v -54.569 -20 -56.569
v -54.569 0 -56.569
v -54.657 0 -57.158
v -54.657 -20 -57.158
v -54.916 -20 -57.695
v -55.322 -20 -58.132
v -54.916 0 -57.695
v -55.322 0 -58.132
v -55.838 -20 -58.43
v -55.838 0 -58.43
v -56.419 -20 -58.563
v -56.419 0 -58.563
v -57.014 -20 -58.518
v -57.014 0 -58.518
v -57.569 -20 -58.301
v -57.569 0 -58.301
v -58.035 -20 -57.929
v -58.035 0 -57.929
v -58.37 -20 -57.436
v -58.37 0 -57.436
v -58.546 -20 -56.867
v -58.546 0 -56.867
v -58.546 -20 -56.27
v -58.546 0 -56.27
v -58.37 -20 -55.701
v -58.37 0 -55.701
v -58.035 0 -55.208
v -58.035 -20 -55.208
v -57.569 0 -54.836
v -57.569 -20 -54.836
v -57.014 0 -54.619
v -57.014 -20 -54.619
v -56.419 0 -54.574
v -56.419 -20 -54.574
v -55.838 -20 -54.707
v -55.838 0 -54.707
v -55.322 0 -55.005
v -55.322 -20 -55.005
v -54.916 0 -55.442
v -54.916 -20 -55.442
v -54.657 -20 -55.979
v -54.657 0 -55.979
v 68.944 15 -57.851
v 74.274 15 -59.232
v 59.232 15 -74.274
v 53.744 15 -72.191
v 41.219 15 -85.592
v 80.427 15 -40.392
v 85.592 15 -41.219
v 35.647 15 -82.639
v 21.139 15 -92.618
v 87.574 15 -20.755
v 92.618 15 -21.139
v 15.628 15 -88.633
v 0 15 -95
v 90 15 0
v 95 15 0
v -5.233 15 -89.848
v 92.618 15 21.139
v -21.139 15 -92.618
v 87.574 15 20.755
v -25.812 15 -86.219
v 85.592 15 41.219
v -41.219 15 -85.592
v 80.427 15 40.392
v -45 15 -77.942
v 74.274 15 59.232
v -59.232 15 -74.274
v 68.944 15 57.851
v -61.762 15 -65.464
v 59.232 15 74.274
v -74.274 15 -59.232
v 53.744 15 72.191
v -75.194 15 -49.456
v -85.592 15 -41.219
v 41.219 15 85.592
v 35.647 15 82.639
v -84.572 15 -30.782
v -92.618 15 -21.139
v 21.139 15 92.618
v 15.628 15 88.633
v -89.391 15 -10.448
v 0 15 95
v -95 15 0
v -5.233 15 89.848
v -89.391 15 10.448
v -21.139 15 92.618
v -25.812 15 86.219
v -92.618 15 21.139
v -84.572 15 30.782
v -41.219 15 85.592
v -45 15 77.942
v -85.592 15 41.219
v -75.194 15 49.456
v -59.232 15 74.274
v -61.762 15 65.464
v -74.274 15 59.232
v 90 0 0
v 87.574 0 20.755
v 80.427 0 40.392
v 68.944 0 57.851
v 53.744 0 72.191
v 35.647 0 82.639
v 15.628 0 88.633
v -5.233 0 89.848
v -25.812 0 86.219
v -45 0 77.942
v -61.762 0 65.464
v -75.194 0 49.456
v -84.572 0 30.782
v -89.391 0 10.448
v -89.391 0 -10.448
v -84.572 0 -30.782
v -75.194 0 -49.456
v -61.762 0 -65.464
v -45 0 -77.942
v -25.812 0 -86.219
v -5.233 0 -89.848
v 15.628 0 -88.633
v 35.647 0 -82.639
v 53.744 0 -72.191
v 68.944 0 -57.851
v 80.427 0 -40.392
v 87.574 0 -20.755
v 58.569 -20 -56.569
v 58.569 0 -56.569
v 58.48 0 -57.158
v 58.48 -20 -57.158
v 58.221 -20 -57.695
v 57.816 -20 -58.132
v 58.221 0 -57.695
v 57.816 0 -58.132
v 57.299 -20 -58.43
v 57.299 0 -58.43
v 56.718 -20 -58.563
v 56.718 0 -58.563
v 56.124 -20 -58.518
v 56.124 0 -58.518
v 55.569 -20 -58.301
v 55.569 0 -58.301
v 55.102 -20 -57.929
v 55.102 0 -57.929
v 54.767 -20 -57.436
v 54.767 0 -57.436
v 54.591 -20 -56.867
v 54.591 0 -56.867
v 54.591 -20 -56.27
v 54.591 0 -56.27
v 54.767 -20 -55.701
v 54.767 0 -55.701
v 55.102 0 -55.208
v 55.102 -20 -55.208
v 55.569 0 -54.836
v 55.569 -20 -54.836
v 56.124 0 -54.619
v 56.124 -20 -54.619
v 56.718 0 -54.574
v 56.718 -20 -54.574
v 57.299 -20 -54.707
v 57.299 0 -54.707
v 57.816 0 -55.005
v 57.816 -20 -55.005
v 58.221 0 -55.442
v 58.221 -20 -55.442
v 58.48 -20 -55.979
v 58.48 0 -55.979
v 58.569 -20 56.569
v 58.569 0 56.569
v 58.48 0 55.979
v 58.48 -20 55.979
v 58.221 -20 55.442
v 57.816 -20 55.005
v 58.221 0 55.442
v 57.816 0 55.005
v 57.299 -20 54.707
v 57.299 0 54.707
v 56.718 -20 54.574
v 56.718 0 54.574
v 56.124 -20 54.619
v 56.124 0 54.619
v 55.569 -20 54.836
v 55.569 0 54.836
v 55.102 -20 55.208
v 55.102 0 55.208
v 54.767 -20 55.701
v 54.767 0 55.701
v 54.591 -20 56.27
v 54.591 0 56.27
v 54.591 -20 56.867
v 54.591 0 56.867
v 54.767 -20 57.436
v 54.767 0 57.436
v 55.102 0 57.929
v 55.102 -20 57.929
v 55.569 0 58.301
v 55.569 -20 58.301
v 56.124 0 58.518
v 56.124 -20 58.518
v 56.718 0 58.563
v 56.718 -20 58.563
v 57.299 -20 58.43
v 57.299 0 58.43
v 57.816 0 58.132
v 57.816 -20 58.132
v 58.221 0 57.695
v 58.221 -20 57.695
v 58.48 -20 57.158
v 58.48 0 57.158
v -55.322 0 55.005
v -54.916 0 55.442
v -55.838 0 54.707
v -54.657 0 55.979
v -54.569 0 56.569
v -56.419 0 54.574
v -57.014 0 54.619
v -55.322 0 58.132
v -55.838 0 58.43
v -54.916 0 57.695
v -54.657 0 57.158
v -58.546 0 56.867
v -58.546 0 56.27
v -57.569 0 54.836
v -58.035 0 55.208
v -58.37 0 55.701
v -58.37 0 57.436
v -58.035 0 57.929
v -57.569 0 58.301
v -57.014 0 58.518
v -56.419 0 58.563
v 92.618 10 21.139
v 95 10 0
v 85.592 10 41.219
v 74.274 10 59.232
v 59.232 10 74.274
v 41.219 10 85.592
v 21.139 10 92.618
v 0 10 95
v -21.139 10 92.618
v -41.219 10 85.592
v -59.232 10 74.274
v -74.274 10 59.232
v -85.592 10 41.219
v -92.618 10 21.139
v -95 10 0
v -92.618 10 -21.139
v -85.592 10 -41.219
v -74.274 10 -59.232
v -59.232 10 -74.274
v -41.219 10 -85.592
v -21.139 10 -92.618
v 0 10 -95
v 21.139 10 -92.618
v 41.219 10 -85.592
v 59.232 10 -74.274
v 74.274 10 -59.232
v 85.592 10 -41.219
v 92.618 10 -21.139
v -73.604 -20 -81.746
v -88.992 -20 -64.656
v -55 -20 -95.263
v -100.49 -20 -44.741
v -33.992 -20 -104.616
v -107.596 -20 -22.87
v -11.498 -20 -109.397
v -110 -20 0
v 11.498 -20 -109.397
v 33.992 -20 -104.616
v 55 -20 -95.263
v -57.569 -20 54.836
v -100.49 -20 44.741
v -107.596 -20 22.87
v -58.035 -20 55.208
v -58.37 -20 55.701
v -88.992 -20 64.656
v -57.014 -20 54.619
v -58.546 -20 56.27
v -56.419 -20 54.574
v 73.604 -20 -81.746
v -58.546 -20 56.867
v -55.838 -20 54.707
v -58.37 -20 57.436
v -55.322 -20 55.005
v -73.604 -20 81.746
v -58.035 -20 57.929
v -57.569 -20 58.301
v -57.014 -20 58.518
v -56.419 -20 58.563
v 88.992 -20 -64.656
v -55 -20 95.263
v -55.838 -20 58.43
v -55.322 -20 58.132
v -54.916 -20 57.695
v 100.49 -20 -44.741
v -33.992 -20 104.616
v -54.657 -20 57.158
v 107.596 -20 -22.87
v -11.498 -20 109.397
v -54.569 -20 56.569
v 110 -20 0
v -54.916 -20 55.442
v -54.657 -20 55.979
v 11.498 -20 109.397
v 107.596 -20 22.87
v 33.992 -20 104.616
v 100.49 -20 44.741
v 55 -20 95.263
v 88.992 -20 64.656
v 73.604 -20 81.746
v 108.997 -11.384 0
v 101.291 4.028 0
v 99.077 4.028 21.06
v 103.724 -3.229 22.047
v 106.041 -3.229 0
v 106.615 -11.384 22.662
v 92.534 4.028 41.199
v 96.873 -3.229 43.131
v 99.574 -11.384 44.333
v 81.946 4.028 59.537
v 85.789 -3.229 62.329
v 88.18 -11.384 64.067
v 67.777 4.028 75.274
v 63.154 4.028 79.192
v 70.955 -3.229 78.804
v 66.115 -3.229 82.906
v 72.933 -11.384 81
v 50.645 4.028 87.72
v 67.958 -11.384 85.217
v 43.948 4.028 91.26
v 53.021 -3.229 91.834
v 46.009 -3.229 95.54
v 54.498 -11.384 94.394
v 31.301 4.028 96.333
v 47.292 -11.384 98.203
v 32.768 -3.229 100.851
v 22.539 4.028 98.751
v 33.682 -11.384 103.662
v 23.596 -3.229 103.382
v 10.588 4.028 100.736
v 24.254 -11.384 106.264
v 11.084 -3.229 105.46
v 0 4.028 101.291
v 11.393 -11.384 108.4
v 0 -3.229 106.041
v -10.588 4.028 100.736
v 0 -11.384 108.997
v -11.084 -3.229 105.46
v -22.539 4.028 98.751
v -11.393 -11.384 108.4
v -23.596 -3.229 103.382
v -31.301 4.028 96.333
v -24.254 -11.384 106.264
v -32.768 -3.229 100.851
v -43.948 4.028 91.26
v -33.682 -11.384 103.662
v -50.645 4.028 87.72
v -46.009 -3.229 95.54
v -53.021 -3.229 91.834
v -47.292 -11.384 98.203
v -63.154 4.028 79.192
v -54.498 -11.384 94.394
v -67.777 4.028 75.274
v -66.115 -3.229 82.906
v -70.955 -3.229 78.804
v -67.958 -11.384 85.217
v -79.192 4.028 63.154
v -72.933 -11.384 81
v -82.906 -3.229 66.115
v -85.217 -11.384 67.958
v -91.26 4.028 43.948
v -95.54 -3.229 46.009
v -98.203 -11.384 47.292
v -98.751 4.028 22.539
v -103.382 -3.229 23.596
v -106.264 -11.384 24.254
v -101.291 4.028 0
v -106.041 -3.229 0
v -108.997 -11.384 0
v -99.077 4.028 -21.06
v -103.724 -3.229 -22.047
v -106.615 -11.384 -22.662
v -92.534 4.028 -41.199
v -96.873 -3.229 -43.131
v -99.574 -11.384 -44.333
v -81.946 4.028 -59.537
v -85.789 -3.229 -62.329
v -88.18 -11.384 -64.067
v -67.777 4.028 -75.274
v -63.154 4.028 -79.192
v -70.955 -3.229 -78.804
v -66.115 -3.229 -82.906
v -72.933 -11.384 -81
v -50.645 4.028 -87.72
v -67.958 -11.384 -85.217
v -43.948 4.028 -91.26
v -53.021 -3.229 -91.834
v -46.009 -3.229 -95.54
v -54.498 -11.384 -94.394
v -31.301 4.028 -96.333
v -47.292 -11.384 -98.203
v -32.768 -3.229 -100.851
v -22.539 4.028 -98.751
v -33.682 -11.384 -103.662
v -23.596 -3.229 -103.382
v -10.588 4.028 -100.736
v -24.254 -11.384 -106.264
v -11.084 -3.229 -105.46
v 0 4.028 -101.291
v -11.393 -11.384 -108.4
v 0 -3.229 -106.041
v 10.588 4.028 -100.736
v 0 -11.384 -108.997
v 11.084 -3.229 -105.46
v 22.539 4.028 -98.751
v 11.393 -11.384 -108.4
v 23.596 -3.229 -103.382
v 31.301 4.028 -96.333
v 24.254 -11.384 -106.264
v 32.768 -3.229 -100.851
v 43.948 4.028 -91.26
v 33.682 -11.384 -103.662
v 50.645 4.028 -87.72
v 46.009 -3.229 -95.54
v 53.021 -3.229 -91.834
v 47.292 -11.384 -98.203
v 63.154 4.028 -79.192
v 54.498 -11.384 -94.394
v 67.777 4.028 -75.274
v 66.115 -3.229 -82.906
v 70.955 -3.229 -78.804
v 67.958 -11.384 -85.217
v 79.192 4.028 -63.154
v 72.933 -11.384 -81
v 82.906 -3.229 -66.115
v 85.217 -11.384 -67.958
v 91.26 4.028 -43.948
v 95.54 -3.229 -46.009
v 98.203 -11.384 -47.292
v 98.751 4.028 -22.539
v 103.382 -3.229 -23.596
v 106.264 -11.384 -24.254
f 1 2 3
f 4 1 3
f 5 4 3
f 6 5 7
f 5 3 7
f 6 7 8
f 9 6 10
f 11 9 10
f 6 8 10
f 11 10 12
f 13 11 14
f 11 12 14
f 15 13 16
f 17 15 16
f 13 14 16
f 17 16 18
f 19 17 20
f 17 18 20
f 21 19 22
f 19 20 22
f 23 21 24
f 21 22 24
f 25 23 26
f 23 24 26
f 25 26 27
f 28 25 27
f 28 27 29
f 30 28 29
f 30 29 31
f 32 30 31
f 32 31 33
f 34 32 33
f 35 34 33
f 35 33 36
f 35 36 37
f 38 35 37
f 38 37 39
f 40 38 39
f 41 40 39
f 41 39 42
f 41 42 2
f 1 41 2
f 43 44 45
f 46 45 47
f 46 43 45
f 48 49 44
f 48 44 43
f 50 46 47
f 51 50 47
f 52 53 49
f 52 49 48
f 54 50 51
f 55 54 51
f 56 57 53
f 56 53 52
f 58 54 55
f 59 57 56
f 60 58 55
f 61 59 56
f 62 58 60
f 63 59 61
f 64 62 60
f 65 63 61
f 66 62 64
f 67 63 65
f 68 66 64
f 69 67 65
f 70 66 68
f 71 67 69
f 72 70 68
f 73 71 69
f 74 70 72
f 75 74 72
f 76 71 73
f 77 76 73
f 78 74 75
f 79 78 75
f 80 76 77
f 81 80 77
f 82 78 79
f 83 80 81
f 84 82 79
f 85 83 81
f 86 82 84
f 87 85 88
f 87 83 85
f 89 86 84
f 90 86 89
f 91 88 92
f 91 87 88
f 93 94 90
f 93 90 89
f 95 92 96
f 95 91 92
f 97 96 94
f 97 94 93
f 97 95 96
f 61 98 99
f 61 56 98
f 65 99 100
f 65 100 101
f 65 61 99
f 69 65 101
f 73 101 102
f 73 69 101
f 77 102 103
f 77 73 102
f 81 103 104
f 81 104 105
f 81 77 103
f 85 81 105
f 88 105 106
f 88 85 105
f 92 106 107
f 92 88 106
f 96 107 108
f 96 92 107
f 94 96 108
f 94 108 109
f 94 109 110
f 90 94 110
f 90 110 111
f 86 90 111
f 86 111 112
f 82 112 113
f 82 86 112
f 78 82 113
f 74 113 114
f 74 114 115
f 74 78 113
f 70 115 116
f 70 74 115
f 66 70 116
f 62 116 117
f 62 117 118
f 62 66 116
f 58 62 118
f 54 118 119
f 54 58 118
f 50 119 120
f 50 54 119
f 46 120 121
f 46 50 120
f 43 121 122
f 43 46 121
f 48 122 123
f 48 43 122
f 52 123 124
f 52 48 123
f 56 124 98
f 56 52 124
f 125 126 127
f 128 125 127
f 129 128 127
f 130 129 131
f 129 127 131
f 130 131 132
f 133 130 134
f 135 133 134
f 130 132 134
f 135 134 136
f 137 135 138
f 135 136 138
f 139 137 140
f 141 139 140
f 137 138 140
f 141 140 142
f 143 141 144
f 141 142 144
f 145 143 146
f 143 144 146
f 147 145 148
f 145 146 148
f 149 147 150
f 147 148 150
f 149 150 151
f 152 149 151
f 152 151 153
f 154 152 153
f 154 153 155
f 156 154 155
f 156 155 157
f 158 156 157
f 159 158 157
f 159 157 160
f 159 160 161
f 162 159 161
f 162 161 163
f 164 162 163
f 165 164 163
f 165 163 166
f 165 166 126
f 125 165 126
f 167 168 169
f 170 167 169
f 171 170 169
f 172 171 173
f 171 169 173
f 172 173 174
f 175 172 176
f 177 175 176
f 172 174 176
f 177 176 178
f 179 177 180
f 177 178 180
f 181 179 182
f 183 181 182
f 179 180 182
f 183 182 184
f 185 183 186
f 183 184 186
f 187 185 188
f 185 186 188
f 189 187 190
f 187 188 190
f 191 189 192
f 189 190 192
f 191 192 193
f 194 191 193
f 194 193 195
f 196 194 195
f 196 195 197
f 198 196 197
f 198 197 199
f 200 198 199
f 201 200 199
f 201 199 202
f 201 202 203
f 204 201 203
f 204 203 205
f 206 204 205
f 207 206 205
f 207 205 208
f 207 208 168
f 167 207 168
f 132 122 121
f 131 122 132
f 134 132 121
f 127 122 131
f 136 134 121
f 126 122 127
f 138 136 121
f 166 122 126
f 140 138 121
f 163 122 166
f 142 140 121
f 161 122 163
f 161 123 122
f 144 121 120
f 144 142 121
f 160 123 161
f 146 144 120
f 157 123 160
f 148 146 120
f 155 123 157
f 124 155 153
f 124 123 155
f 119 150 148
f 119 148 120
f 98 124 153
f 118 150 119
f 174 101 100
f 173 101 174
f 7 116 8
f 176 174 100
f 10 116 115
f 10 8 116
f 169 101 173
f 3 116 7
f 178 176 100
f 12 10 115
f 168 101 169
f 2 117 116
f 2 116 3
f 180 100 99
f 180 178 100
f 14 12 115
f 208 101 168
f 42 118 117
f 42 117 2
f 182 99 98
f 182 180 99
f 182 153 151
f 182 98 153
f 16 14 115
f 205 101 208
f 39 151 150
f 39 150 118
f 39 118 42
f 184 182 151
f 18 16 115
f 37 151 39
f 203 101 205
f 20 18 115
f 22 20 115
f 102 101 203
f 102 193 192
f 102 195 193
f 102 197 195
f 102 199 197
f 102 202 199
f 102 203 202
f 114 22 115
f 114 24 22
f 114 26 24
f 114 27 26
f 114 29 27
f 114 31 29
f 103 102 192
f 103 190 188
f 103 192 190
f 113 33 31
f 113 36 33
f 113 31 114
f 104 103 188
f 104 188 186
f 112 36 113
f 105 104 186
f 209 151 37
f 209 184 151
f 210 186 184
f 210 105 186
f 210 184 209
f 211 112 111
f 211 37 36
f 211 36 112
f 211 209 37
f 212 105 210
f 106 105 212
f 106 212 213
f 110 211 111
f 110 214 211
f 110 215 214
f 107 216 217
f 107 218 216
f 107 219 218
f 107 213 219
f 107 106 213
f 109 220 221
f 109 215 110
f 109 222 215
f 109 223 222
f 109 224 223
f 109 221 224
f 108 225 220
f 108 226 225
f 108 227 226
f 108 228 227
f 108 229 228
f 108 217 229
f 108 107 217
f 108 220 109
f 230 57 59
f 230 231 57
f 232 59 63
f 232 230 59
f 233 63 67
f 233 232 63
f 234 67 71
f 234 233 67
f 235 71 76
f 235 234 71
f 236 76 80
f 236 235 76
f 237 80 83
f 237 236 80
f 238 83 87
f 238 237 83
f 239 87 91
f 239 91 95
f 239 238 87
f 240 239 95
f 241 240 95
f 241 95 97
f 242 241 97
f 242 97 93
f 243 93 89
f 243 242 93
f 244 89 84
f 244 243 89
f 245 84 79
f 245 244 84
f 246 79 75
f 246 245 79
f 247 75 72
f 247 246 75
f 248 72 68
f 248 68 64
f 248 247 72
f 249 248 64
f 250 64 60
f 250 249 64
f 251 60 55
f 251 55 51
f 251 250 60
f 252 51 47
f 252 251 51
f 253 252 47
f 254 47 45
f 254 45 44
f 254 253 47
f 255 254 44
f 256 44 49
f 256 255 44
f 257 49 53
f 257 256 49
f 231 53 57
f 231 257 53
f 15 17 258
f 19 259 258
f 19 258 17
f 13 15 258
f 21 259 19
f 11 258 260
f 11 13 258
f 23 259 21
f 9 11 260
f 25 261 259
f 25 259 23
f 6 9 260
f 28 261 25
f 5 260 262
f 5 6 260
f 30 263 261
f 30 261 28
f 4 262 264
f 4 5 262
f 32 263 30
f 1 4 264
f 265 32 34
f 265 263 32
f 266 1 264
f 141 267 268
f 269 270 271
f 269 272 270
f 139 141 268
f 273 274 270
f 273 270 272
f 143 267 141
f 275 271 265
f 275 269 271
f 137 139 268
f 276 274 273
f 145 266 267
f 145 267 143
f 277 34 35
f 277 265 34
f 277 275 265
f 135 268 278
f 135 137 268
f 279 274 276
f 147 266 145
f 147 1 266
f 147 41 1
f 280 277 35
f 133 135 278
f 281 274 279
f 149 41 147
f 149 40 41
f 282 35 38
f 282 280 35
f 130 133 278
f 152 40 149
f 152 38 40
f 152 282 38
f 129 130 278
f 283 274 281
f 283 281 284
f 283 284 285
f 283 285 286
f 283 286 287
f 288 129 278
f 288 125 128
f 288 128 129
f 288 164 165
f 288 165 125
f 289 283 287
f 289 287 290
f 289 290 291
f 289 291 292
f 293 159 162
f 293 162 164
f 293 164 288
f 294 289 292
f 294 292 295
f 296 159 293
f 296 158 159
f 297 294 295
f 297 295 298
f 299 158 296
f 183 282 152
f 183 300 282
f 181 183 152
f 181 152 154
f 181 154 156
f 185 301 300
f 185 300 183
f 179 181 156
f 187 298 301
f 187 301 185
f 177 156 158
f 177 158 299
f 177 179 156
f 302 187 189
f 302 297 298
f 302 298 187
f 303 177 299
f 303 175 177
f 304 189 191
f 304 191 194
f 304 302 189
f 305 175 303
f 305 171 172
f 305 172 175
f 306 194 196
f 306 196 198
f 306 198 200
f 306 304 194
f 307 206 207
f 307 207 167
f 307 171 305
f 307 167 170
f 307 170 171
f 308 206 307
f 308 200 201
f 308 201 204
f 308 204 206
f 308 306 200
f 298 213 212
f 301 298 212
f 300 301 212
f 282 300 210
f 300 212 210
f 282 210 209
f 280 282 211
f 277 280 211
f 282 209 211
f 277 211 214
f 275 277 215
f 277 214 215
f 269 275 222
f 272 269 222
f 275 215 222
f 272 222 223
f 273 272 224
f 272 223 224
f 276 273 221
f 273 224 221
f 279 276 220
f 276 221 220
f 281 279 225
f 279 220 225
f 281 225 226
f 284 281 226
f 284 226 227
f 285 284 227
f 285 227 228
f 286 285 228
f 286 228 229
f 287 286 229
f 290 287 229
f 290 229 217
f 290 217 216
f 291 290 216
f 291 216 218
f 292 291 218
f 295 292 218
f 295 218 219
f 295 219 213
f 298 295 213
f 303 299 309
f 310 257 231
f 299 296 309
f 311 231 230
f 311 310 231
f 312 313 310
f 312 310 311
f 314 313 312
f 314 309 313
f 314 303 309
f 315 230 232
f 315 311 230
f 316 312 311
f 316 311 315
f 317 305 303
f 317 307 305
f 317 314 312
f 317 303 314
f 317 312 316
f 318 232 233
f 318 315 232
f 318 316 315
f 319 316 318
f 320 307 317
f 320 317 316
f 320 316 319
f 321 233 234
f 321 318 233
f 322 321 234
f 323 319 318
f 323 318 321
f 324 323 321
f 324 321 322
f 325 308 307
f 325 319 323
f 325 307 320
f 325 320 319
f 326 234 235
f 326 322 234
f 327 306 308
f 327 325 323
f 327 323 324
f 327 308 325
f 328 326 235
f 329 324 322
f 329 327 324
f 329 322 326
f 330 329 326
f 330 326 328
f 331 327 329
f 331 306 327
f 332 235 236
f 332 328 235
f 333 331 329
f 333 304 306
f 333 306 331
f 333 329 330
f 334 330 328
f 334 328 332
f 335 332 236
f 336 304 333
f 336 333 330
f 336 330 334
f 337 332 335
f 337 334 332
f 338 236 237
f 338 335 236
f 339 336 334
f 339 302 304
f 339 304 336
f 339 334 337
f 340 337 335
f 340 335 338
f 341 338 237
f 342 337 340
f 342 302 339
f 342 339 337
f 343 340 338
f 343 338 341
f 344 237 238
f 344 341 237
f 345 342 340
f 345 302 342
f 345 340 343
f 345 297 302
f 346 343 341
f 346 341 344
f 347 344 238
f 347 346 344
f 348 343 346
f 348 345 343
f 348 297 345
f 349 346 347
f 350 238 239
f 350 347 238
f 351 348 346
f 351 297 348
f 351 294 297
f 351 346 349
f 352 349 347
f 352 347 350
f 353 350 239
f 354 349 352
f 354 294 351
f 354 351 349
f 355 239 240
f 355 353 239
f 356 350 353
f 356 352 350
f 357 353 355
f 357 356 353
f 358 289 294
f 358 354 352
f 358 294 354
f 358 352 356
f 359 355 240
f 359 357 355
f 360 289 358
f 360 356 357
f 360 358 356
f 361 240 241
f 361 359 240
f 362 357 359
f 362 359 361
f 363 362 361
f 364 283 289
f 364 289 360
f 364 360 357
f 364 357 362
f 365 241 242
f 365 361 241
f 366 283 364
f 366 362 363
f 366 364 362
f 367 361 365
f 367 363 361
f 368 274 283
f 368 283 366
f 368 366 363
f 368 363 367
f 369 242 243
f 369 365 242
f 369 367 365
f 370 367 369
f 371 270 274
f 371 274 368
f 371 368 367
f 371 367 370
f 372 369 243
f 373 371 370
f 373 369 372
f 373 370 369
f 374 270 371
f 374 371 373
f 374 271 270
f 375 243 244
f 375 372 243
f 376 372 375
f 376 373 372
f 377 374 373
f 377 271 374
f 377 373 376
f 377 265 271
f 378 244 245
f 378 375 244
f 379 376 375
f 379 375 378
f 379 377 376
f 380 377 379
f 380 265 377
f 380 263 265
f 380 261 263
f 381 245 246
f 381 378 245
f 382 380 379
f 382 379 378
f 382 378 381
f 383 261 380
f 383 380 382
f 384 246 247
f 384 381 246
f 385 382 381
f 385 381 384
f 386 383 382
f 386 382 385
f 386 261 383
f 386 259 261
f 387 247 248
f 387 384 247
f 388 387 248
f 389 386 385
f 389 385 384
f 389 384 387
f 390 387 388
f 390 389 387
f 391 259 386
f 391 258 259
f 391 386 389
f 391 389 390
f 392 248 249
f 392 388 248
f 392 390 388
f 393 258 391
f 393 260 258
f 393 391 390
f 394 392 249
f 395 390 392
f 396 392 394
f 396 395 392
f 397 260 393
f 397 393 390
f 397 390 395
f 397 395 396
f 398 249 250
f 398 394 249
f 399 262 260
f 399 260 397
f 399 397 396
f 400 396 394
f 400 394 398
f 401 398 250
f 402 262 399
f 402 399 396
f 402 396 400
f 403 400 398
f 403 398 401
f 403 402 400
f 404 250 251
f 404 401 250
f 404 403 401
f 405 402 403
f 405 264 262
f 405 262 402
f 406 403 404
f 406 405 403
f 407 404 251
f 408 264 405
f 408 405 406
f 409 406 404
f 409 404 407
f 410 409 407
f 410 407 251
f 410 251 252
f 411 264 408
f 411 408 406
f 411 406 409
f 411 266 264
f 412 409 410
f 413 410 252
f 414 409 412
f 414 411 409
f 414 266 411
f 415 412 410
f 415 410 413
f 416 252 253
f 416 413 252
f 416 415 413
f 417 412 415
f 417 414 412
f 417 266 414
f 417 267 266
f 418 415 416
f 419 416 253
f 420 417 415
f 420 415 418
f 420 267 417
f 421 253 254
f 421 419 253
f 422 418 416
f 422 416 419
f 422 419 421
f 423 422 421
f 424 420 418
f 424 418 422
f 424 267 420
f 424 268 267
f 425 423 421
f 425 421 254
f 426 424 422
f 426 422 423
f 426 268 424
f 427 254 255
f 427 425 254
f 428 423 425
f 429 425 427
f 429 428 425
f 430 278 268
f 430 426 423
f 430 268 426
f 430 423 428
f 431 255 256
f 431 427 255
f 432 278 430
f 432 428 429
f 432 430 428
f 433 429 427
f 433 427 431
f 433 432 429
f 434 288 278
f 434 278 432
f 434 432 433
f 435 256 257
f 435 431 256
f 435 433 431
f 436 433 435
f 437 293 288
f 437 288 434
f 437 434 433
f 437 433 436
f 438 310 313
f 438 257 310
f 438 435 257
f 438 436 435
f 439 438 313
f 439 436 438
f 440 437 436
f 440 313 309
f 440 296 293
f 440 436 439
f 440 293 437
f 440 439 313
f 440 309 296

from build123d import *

# Parameters (mm, degrees)
SKETCH1_R          = 2
CUT_EXTRUDE1_DEPTH = 21


with BuildPart() as part:
    # Sketch2 → Revolve1 (revolve)
    with BuildSketch(Plane.XY):
        with BuildLine():
            Line((90, 0), (90, 15))
            Line((90, 15), (95, 15))
            Line((95, 15), (95, 10))
            ThreePointArc((95, 10), (106.041019662, -3.229490169), (110, -20))
            Line((110, -20), (0, -20))
            Line((0, -20), (0, 0))
            Line((0, 0), (90, 0))
        make_face()
    revolve(axis=Axis((0, 0, 0), (0, -1, 0)))

    # Sketch1 → Cut-Extrude1 (cut, through all)
    with BuildSketch(Plane(origin=(0, 0, 0), x_dir=(1, 0, 0), z_dir=(0, 1, 0))):
        with Locations((-56.568542495, 56.568542495)):
            Circle(SKETCH1_R)
        with Locations((-56.568542495, -56.568542495)):
            Circle(SKETCH1_R)
        with Locations((56.568542495, 56.568542495)):
            Circle(SKETCH1_R)
        with Locations((56.568542495, -56.568542495)):
            Circle(SKETCH1_R)
    extrude(amount=-CUT_EXTRUDE1_DEPTH, mode=Mode.SUBTRACT)


solid = part.part
